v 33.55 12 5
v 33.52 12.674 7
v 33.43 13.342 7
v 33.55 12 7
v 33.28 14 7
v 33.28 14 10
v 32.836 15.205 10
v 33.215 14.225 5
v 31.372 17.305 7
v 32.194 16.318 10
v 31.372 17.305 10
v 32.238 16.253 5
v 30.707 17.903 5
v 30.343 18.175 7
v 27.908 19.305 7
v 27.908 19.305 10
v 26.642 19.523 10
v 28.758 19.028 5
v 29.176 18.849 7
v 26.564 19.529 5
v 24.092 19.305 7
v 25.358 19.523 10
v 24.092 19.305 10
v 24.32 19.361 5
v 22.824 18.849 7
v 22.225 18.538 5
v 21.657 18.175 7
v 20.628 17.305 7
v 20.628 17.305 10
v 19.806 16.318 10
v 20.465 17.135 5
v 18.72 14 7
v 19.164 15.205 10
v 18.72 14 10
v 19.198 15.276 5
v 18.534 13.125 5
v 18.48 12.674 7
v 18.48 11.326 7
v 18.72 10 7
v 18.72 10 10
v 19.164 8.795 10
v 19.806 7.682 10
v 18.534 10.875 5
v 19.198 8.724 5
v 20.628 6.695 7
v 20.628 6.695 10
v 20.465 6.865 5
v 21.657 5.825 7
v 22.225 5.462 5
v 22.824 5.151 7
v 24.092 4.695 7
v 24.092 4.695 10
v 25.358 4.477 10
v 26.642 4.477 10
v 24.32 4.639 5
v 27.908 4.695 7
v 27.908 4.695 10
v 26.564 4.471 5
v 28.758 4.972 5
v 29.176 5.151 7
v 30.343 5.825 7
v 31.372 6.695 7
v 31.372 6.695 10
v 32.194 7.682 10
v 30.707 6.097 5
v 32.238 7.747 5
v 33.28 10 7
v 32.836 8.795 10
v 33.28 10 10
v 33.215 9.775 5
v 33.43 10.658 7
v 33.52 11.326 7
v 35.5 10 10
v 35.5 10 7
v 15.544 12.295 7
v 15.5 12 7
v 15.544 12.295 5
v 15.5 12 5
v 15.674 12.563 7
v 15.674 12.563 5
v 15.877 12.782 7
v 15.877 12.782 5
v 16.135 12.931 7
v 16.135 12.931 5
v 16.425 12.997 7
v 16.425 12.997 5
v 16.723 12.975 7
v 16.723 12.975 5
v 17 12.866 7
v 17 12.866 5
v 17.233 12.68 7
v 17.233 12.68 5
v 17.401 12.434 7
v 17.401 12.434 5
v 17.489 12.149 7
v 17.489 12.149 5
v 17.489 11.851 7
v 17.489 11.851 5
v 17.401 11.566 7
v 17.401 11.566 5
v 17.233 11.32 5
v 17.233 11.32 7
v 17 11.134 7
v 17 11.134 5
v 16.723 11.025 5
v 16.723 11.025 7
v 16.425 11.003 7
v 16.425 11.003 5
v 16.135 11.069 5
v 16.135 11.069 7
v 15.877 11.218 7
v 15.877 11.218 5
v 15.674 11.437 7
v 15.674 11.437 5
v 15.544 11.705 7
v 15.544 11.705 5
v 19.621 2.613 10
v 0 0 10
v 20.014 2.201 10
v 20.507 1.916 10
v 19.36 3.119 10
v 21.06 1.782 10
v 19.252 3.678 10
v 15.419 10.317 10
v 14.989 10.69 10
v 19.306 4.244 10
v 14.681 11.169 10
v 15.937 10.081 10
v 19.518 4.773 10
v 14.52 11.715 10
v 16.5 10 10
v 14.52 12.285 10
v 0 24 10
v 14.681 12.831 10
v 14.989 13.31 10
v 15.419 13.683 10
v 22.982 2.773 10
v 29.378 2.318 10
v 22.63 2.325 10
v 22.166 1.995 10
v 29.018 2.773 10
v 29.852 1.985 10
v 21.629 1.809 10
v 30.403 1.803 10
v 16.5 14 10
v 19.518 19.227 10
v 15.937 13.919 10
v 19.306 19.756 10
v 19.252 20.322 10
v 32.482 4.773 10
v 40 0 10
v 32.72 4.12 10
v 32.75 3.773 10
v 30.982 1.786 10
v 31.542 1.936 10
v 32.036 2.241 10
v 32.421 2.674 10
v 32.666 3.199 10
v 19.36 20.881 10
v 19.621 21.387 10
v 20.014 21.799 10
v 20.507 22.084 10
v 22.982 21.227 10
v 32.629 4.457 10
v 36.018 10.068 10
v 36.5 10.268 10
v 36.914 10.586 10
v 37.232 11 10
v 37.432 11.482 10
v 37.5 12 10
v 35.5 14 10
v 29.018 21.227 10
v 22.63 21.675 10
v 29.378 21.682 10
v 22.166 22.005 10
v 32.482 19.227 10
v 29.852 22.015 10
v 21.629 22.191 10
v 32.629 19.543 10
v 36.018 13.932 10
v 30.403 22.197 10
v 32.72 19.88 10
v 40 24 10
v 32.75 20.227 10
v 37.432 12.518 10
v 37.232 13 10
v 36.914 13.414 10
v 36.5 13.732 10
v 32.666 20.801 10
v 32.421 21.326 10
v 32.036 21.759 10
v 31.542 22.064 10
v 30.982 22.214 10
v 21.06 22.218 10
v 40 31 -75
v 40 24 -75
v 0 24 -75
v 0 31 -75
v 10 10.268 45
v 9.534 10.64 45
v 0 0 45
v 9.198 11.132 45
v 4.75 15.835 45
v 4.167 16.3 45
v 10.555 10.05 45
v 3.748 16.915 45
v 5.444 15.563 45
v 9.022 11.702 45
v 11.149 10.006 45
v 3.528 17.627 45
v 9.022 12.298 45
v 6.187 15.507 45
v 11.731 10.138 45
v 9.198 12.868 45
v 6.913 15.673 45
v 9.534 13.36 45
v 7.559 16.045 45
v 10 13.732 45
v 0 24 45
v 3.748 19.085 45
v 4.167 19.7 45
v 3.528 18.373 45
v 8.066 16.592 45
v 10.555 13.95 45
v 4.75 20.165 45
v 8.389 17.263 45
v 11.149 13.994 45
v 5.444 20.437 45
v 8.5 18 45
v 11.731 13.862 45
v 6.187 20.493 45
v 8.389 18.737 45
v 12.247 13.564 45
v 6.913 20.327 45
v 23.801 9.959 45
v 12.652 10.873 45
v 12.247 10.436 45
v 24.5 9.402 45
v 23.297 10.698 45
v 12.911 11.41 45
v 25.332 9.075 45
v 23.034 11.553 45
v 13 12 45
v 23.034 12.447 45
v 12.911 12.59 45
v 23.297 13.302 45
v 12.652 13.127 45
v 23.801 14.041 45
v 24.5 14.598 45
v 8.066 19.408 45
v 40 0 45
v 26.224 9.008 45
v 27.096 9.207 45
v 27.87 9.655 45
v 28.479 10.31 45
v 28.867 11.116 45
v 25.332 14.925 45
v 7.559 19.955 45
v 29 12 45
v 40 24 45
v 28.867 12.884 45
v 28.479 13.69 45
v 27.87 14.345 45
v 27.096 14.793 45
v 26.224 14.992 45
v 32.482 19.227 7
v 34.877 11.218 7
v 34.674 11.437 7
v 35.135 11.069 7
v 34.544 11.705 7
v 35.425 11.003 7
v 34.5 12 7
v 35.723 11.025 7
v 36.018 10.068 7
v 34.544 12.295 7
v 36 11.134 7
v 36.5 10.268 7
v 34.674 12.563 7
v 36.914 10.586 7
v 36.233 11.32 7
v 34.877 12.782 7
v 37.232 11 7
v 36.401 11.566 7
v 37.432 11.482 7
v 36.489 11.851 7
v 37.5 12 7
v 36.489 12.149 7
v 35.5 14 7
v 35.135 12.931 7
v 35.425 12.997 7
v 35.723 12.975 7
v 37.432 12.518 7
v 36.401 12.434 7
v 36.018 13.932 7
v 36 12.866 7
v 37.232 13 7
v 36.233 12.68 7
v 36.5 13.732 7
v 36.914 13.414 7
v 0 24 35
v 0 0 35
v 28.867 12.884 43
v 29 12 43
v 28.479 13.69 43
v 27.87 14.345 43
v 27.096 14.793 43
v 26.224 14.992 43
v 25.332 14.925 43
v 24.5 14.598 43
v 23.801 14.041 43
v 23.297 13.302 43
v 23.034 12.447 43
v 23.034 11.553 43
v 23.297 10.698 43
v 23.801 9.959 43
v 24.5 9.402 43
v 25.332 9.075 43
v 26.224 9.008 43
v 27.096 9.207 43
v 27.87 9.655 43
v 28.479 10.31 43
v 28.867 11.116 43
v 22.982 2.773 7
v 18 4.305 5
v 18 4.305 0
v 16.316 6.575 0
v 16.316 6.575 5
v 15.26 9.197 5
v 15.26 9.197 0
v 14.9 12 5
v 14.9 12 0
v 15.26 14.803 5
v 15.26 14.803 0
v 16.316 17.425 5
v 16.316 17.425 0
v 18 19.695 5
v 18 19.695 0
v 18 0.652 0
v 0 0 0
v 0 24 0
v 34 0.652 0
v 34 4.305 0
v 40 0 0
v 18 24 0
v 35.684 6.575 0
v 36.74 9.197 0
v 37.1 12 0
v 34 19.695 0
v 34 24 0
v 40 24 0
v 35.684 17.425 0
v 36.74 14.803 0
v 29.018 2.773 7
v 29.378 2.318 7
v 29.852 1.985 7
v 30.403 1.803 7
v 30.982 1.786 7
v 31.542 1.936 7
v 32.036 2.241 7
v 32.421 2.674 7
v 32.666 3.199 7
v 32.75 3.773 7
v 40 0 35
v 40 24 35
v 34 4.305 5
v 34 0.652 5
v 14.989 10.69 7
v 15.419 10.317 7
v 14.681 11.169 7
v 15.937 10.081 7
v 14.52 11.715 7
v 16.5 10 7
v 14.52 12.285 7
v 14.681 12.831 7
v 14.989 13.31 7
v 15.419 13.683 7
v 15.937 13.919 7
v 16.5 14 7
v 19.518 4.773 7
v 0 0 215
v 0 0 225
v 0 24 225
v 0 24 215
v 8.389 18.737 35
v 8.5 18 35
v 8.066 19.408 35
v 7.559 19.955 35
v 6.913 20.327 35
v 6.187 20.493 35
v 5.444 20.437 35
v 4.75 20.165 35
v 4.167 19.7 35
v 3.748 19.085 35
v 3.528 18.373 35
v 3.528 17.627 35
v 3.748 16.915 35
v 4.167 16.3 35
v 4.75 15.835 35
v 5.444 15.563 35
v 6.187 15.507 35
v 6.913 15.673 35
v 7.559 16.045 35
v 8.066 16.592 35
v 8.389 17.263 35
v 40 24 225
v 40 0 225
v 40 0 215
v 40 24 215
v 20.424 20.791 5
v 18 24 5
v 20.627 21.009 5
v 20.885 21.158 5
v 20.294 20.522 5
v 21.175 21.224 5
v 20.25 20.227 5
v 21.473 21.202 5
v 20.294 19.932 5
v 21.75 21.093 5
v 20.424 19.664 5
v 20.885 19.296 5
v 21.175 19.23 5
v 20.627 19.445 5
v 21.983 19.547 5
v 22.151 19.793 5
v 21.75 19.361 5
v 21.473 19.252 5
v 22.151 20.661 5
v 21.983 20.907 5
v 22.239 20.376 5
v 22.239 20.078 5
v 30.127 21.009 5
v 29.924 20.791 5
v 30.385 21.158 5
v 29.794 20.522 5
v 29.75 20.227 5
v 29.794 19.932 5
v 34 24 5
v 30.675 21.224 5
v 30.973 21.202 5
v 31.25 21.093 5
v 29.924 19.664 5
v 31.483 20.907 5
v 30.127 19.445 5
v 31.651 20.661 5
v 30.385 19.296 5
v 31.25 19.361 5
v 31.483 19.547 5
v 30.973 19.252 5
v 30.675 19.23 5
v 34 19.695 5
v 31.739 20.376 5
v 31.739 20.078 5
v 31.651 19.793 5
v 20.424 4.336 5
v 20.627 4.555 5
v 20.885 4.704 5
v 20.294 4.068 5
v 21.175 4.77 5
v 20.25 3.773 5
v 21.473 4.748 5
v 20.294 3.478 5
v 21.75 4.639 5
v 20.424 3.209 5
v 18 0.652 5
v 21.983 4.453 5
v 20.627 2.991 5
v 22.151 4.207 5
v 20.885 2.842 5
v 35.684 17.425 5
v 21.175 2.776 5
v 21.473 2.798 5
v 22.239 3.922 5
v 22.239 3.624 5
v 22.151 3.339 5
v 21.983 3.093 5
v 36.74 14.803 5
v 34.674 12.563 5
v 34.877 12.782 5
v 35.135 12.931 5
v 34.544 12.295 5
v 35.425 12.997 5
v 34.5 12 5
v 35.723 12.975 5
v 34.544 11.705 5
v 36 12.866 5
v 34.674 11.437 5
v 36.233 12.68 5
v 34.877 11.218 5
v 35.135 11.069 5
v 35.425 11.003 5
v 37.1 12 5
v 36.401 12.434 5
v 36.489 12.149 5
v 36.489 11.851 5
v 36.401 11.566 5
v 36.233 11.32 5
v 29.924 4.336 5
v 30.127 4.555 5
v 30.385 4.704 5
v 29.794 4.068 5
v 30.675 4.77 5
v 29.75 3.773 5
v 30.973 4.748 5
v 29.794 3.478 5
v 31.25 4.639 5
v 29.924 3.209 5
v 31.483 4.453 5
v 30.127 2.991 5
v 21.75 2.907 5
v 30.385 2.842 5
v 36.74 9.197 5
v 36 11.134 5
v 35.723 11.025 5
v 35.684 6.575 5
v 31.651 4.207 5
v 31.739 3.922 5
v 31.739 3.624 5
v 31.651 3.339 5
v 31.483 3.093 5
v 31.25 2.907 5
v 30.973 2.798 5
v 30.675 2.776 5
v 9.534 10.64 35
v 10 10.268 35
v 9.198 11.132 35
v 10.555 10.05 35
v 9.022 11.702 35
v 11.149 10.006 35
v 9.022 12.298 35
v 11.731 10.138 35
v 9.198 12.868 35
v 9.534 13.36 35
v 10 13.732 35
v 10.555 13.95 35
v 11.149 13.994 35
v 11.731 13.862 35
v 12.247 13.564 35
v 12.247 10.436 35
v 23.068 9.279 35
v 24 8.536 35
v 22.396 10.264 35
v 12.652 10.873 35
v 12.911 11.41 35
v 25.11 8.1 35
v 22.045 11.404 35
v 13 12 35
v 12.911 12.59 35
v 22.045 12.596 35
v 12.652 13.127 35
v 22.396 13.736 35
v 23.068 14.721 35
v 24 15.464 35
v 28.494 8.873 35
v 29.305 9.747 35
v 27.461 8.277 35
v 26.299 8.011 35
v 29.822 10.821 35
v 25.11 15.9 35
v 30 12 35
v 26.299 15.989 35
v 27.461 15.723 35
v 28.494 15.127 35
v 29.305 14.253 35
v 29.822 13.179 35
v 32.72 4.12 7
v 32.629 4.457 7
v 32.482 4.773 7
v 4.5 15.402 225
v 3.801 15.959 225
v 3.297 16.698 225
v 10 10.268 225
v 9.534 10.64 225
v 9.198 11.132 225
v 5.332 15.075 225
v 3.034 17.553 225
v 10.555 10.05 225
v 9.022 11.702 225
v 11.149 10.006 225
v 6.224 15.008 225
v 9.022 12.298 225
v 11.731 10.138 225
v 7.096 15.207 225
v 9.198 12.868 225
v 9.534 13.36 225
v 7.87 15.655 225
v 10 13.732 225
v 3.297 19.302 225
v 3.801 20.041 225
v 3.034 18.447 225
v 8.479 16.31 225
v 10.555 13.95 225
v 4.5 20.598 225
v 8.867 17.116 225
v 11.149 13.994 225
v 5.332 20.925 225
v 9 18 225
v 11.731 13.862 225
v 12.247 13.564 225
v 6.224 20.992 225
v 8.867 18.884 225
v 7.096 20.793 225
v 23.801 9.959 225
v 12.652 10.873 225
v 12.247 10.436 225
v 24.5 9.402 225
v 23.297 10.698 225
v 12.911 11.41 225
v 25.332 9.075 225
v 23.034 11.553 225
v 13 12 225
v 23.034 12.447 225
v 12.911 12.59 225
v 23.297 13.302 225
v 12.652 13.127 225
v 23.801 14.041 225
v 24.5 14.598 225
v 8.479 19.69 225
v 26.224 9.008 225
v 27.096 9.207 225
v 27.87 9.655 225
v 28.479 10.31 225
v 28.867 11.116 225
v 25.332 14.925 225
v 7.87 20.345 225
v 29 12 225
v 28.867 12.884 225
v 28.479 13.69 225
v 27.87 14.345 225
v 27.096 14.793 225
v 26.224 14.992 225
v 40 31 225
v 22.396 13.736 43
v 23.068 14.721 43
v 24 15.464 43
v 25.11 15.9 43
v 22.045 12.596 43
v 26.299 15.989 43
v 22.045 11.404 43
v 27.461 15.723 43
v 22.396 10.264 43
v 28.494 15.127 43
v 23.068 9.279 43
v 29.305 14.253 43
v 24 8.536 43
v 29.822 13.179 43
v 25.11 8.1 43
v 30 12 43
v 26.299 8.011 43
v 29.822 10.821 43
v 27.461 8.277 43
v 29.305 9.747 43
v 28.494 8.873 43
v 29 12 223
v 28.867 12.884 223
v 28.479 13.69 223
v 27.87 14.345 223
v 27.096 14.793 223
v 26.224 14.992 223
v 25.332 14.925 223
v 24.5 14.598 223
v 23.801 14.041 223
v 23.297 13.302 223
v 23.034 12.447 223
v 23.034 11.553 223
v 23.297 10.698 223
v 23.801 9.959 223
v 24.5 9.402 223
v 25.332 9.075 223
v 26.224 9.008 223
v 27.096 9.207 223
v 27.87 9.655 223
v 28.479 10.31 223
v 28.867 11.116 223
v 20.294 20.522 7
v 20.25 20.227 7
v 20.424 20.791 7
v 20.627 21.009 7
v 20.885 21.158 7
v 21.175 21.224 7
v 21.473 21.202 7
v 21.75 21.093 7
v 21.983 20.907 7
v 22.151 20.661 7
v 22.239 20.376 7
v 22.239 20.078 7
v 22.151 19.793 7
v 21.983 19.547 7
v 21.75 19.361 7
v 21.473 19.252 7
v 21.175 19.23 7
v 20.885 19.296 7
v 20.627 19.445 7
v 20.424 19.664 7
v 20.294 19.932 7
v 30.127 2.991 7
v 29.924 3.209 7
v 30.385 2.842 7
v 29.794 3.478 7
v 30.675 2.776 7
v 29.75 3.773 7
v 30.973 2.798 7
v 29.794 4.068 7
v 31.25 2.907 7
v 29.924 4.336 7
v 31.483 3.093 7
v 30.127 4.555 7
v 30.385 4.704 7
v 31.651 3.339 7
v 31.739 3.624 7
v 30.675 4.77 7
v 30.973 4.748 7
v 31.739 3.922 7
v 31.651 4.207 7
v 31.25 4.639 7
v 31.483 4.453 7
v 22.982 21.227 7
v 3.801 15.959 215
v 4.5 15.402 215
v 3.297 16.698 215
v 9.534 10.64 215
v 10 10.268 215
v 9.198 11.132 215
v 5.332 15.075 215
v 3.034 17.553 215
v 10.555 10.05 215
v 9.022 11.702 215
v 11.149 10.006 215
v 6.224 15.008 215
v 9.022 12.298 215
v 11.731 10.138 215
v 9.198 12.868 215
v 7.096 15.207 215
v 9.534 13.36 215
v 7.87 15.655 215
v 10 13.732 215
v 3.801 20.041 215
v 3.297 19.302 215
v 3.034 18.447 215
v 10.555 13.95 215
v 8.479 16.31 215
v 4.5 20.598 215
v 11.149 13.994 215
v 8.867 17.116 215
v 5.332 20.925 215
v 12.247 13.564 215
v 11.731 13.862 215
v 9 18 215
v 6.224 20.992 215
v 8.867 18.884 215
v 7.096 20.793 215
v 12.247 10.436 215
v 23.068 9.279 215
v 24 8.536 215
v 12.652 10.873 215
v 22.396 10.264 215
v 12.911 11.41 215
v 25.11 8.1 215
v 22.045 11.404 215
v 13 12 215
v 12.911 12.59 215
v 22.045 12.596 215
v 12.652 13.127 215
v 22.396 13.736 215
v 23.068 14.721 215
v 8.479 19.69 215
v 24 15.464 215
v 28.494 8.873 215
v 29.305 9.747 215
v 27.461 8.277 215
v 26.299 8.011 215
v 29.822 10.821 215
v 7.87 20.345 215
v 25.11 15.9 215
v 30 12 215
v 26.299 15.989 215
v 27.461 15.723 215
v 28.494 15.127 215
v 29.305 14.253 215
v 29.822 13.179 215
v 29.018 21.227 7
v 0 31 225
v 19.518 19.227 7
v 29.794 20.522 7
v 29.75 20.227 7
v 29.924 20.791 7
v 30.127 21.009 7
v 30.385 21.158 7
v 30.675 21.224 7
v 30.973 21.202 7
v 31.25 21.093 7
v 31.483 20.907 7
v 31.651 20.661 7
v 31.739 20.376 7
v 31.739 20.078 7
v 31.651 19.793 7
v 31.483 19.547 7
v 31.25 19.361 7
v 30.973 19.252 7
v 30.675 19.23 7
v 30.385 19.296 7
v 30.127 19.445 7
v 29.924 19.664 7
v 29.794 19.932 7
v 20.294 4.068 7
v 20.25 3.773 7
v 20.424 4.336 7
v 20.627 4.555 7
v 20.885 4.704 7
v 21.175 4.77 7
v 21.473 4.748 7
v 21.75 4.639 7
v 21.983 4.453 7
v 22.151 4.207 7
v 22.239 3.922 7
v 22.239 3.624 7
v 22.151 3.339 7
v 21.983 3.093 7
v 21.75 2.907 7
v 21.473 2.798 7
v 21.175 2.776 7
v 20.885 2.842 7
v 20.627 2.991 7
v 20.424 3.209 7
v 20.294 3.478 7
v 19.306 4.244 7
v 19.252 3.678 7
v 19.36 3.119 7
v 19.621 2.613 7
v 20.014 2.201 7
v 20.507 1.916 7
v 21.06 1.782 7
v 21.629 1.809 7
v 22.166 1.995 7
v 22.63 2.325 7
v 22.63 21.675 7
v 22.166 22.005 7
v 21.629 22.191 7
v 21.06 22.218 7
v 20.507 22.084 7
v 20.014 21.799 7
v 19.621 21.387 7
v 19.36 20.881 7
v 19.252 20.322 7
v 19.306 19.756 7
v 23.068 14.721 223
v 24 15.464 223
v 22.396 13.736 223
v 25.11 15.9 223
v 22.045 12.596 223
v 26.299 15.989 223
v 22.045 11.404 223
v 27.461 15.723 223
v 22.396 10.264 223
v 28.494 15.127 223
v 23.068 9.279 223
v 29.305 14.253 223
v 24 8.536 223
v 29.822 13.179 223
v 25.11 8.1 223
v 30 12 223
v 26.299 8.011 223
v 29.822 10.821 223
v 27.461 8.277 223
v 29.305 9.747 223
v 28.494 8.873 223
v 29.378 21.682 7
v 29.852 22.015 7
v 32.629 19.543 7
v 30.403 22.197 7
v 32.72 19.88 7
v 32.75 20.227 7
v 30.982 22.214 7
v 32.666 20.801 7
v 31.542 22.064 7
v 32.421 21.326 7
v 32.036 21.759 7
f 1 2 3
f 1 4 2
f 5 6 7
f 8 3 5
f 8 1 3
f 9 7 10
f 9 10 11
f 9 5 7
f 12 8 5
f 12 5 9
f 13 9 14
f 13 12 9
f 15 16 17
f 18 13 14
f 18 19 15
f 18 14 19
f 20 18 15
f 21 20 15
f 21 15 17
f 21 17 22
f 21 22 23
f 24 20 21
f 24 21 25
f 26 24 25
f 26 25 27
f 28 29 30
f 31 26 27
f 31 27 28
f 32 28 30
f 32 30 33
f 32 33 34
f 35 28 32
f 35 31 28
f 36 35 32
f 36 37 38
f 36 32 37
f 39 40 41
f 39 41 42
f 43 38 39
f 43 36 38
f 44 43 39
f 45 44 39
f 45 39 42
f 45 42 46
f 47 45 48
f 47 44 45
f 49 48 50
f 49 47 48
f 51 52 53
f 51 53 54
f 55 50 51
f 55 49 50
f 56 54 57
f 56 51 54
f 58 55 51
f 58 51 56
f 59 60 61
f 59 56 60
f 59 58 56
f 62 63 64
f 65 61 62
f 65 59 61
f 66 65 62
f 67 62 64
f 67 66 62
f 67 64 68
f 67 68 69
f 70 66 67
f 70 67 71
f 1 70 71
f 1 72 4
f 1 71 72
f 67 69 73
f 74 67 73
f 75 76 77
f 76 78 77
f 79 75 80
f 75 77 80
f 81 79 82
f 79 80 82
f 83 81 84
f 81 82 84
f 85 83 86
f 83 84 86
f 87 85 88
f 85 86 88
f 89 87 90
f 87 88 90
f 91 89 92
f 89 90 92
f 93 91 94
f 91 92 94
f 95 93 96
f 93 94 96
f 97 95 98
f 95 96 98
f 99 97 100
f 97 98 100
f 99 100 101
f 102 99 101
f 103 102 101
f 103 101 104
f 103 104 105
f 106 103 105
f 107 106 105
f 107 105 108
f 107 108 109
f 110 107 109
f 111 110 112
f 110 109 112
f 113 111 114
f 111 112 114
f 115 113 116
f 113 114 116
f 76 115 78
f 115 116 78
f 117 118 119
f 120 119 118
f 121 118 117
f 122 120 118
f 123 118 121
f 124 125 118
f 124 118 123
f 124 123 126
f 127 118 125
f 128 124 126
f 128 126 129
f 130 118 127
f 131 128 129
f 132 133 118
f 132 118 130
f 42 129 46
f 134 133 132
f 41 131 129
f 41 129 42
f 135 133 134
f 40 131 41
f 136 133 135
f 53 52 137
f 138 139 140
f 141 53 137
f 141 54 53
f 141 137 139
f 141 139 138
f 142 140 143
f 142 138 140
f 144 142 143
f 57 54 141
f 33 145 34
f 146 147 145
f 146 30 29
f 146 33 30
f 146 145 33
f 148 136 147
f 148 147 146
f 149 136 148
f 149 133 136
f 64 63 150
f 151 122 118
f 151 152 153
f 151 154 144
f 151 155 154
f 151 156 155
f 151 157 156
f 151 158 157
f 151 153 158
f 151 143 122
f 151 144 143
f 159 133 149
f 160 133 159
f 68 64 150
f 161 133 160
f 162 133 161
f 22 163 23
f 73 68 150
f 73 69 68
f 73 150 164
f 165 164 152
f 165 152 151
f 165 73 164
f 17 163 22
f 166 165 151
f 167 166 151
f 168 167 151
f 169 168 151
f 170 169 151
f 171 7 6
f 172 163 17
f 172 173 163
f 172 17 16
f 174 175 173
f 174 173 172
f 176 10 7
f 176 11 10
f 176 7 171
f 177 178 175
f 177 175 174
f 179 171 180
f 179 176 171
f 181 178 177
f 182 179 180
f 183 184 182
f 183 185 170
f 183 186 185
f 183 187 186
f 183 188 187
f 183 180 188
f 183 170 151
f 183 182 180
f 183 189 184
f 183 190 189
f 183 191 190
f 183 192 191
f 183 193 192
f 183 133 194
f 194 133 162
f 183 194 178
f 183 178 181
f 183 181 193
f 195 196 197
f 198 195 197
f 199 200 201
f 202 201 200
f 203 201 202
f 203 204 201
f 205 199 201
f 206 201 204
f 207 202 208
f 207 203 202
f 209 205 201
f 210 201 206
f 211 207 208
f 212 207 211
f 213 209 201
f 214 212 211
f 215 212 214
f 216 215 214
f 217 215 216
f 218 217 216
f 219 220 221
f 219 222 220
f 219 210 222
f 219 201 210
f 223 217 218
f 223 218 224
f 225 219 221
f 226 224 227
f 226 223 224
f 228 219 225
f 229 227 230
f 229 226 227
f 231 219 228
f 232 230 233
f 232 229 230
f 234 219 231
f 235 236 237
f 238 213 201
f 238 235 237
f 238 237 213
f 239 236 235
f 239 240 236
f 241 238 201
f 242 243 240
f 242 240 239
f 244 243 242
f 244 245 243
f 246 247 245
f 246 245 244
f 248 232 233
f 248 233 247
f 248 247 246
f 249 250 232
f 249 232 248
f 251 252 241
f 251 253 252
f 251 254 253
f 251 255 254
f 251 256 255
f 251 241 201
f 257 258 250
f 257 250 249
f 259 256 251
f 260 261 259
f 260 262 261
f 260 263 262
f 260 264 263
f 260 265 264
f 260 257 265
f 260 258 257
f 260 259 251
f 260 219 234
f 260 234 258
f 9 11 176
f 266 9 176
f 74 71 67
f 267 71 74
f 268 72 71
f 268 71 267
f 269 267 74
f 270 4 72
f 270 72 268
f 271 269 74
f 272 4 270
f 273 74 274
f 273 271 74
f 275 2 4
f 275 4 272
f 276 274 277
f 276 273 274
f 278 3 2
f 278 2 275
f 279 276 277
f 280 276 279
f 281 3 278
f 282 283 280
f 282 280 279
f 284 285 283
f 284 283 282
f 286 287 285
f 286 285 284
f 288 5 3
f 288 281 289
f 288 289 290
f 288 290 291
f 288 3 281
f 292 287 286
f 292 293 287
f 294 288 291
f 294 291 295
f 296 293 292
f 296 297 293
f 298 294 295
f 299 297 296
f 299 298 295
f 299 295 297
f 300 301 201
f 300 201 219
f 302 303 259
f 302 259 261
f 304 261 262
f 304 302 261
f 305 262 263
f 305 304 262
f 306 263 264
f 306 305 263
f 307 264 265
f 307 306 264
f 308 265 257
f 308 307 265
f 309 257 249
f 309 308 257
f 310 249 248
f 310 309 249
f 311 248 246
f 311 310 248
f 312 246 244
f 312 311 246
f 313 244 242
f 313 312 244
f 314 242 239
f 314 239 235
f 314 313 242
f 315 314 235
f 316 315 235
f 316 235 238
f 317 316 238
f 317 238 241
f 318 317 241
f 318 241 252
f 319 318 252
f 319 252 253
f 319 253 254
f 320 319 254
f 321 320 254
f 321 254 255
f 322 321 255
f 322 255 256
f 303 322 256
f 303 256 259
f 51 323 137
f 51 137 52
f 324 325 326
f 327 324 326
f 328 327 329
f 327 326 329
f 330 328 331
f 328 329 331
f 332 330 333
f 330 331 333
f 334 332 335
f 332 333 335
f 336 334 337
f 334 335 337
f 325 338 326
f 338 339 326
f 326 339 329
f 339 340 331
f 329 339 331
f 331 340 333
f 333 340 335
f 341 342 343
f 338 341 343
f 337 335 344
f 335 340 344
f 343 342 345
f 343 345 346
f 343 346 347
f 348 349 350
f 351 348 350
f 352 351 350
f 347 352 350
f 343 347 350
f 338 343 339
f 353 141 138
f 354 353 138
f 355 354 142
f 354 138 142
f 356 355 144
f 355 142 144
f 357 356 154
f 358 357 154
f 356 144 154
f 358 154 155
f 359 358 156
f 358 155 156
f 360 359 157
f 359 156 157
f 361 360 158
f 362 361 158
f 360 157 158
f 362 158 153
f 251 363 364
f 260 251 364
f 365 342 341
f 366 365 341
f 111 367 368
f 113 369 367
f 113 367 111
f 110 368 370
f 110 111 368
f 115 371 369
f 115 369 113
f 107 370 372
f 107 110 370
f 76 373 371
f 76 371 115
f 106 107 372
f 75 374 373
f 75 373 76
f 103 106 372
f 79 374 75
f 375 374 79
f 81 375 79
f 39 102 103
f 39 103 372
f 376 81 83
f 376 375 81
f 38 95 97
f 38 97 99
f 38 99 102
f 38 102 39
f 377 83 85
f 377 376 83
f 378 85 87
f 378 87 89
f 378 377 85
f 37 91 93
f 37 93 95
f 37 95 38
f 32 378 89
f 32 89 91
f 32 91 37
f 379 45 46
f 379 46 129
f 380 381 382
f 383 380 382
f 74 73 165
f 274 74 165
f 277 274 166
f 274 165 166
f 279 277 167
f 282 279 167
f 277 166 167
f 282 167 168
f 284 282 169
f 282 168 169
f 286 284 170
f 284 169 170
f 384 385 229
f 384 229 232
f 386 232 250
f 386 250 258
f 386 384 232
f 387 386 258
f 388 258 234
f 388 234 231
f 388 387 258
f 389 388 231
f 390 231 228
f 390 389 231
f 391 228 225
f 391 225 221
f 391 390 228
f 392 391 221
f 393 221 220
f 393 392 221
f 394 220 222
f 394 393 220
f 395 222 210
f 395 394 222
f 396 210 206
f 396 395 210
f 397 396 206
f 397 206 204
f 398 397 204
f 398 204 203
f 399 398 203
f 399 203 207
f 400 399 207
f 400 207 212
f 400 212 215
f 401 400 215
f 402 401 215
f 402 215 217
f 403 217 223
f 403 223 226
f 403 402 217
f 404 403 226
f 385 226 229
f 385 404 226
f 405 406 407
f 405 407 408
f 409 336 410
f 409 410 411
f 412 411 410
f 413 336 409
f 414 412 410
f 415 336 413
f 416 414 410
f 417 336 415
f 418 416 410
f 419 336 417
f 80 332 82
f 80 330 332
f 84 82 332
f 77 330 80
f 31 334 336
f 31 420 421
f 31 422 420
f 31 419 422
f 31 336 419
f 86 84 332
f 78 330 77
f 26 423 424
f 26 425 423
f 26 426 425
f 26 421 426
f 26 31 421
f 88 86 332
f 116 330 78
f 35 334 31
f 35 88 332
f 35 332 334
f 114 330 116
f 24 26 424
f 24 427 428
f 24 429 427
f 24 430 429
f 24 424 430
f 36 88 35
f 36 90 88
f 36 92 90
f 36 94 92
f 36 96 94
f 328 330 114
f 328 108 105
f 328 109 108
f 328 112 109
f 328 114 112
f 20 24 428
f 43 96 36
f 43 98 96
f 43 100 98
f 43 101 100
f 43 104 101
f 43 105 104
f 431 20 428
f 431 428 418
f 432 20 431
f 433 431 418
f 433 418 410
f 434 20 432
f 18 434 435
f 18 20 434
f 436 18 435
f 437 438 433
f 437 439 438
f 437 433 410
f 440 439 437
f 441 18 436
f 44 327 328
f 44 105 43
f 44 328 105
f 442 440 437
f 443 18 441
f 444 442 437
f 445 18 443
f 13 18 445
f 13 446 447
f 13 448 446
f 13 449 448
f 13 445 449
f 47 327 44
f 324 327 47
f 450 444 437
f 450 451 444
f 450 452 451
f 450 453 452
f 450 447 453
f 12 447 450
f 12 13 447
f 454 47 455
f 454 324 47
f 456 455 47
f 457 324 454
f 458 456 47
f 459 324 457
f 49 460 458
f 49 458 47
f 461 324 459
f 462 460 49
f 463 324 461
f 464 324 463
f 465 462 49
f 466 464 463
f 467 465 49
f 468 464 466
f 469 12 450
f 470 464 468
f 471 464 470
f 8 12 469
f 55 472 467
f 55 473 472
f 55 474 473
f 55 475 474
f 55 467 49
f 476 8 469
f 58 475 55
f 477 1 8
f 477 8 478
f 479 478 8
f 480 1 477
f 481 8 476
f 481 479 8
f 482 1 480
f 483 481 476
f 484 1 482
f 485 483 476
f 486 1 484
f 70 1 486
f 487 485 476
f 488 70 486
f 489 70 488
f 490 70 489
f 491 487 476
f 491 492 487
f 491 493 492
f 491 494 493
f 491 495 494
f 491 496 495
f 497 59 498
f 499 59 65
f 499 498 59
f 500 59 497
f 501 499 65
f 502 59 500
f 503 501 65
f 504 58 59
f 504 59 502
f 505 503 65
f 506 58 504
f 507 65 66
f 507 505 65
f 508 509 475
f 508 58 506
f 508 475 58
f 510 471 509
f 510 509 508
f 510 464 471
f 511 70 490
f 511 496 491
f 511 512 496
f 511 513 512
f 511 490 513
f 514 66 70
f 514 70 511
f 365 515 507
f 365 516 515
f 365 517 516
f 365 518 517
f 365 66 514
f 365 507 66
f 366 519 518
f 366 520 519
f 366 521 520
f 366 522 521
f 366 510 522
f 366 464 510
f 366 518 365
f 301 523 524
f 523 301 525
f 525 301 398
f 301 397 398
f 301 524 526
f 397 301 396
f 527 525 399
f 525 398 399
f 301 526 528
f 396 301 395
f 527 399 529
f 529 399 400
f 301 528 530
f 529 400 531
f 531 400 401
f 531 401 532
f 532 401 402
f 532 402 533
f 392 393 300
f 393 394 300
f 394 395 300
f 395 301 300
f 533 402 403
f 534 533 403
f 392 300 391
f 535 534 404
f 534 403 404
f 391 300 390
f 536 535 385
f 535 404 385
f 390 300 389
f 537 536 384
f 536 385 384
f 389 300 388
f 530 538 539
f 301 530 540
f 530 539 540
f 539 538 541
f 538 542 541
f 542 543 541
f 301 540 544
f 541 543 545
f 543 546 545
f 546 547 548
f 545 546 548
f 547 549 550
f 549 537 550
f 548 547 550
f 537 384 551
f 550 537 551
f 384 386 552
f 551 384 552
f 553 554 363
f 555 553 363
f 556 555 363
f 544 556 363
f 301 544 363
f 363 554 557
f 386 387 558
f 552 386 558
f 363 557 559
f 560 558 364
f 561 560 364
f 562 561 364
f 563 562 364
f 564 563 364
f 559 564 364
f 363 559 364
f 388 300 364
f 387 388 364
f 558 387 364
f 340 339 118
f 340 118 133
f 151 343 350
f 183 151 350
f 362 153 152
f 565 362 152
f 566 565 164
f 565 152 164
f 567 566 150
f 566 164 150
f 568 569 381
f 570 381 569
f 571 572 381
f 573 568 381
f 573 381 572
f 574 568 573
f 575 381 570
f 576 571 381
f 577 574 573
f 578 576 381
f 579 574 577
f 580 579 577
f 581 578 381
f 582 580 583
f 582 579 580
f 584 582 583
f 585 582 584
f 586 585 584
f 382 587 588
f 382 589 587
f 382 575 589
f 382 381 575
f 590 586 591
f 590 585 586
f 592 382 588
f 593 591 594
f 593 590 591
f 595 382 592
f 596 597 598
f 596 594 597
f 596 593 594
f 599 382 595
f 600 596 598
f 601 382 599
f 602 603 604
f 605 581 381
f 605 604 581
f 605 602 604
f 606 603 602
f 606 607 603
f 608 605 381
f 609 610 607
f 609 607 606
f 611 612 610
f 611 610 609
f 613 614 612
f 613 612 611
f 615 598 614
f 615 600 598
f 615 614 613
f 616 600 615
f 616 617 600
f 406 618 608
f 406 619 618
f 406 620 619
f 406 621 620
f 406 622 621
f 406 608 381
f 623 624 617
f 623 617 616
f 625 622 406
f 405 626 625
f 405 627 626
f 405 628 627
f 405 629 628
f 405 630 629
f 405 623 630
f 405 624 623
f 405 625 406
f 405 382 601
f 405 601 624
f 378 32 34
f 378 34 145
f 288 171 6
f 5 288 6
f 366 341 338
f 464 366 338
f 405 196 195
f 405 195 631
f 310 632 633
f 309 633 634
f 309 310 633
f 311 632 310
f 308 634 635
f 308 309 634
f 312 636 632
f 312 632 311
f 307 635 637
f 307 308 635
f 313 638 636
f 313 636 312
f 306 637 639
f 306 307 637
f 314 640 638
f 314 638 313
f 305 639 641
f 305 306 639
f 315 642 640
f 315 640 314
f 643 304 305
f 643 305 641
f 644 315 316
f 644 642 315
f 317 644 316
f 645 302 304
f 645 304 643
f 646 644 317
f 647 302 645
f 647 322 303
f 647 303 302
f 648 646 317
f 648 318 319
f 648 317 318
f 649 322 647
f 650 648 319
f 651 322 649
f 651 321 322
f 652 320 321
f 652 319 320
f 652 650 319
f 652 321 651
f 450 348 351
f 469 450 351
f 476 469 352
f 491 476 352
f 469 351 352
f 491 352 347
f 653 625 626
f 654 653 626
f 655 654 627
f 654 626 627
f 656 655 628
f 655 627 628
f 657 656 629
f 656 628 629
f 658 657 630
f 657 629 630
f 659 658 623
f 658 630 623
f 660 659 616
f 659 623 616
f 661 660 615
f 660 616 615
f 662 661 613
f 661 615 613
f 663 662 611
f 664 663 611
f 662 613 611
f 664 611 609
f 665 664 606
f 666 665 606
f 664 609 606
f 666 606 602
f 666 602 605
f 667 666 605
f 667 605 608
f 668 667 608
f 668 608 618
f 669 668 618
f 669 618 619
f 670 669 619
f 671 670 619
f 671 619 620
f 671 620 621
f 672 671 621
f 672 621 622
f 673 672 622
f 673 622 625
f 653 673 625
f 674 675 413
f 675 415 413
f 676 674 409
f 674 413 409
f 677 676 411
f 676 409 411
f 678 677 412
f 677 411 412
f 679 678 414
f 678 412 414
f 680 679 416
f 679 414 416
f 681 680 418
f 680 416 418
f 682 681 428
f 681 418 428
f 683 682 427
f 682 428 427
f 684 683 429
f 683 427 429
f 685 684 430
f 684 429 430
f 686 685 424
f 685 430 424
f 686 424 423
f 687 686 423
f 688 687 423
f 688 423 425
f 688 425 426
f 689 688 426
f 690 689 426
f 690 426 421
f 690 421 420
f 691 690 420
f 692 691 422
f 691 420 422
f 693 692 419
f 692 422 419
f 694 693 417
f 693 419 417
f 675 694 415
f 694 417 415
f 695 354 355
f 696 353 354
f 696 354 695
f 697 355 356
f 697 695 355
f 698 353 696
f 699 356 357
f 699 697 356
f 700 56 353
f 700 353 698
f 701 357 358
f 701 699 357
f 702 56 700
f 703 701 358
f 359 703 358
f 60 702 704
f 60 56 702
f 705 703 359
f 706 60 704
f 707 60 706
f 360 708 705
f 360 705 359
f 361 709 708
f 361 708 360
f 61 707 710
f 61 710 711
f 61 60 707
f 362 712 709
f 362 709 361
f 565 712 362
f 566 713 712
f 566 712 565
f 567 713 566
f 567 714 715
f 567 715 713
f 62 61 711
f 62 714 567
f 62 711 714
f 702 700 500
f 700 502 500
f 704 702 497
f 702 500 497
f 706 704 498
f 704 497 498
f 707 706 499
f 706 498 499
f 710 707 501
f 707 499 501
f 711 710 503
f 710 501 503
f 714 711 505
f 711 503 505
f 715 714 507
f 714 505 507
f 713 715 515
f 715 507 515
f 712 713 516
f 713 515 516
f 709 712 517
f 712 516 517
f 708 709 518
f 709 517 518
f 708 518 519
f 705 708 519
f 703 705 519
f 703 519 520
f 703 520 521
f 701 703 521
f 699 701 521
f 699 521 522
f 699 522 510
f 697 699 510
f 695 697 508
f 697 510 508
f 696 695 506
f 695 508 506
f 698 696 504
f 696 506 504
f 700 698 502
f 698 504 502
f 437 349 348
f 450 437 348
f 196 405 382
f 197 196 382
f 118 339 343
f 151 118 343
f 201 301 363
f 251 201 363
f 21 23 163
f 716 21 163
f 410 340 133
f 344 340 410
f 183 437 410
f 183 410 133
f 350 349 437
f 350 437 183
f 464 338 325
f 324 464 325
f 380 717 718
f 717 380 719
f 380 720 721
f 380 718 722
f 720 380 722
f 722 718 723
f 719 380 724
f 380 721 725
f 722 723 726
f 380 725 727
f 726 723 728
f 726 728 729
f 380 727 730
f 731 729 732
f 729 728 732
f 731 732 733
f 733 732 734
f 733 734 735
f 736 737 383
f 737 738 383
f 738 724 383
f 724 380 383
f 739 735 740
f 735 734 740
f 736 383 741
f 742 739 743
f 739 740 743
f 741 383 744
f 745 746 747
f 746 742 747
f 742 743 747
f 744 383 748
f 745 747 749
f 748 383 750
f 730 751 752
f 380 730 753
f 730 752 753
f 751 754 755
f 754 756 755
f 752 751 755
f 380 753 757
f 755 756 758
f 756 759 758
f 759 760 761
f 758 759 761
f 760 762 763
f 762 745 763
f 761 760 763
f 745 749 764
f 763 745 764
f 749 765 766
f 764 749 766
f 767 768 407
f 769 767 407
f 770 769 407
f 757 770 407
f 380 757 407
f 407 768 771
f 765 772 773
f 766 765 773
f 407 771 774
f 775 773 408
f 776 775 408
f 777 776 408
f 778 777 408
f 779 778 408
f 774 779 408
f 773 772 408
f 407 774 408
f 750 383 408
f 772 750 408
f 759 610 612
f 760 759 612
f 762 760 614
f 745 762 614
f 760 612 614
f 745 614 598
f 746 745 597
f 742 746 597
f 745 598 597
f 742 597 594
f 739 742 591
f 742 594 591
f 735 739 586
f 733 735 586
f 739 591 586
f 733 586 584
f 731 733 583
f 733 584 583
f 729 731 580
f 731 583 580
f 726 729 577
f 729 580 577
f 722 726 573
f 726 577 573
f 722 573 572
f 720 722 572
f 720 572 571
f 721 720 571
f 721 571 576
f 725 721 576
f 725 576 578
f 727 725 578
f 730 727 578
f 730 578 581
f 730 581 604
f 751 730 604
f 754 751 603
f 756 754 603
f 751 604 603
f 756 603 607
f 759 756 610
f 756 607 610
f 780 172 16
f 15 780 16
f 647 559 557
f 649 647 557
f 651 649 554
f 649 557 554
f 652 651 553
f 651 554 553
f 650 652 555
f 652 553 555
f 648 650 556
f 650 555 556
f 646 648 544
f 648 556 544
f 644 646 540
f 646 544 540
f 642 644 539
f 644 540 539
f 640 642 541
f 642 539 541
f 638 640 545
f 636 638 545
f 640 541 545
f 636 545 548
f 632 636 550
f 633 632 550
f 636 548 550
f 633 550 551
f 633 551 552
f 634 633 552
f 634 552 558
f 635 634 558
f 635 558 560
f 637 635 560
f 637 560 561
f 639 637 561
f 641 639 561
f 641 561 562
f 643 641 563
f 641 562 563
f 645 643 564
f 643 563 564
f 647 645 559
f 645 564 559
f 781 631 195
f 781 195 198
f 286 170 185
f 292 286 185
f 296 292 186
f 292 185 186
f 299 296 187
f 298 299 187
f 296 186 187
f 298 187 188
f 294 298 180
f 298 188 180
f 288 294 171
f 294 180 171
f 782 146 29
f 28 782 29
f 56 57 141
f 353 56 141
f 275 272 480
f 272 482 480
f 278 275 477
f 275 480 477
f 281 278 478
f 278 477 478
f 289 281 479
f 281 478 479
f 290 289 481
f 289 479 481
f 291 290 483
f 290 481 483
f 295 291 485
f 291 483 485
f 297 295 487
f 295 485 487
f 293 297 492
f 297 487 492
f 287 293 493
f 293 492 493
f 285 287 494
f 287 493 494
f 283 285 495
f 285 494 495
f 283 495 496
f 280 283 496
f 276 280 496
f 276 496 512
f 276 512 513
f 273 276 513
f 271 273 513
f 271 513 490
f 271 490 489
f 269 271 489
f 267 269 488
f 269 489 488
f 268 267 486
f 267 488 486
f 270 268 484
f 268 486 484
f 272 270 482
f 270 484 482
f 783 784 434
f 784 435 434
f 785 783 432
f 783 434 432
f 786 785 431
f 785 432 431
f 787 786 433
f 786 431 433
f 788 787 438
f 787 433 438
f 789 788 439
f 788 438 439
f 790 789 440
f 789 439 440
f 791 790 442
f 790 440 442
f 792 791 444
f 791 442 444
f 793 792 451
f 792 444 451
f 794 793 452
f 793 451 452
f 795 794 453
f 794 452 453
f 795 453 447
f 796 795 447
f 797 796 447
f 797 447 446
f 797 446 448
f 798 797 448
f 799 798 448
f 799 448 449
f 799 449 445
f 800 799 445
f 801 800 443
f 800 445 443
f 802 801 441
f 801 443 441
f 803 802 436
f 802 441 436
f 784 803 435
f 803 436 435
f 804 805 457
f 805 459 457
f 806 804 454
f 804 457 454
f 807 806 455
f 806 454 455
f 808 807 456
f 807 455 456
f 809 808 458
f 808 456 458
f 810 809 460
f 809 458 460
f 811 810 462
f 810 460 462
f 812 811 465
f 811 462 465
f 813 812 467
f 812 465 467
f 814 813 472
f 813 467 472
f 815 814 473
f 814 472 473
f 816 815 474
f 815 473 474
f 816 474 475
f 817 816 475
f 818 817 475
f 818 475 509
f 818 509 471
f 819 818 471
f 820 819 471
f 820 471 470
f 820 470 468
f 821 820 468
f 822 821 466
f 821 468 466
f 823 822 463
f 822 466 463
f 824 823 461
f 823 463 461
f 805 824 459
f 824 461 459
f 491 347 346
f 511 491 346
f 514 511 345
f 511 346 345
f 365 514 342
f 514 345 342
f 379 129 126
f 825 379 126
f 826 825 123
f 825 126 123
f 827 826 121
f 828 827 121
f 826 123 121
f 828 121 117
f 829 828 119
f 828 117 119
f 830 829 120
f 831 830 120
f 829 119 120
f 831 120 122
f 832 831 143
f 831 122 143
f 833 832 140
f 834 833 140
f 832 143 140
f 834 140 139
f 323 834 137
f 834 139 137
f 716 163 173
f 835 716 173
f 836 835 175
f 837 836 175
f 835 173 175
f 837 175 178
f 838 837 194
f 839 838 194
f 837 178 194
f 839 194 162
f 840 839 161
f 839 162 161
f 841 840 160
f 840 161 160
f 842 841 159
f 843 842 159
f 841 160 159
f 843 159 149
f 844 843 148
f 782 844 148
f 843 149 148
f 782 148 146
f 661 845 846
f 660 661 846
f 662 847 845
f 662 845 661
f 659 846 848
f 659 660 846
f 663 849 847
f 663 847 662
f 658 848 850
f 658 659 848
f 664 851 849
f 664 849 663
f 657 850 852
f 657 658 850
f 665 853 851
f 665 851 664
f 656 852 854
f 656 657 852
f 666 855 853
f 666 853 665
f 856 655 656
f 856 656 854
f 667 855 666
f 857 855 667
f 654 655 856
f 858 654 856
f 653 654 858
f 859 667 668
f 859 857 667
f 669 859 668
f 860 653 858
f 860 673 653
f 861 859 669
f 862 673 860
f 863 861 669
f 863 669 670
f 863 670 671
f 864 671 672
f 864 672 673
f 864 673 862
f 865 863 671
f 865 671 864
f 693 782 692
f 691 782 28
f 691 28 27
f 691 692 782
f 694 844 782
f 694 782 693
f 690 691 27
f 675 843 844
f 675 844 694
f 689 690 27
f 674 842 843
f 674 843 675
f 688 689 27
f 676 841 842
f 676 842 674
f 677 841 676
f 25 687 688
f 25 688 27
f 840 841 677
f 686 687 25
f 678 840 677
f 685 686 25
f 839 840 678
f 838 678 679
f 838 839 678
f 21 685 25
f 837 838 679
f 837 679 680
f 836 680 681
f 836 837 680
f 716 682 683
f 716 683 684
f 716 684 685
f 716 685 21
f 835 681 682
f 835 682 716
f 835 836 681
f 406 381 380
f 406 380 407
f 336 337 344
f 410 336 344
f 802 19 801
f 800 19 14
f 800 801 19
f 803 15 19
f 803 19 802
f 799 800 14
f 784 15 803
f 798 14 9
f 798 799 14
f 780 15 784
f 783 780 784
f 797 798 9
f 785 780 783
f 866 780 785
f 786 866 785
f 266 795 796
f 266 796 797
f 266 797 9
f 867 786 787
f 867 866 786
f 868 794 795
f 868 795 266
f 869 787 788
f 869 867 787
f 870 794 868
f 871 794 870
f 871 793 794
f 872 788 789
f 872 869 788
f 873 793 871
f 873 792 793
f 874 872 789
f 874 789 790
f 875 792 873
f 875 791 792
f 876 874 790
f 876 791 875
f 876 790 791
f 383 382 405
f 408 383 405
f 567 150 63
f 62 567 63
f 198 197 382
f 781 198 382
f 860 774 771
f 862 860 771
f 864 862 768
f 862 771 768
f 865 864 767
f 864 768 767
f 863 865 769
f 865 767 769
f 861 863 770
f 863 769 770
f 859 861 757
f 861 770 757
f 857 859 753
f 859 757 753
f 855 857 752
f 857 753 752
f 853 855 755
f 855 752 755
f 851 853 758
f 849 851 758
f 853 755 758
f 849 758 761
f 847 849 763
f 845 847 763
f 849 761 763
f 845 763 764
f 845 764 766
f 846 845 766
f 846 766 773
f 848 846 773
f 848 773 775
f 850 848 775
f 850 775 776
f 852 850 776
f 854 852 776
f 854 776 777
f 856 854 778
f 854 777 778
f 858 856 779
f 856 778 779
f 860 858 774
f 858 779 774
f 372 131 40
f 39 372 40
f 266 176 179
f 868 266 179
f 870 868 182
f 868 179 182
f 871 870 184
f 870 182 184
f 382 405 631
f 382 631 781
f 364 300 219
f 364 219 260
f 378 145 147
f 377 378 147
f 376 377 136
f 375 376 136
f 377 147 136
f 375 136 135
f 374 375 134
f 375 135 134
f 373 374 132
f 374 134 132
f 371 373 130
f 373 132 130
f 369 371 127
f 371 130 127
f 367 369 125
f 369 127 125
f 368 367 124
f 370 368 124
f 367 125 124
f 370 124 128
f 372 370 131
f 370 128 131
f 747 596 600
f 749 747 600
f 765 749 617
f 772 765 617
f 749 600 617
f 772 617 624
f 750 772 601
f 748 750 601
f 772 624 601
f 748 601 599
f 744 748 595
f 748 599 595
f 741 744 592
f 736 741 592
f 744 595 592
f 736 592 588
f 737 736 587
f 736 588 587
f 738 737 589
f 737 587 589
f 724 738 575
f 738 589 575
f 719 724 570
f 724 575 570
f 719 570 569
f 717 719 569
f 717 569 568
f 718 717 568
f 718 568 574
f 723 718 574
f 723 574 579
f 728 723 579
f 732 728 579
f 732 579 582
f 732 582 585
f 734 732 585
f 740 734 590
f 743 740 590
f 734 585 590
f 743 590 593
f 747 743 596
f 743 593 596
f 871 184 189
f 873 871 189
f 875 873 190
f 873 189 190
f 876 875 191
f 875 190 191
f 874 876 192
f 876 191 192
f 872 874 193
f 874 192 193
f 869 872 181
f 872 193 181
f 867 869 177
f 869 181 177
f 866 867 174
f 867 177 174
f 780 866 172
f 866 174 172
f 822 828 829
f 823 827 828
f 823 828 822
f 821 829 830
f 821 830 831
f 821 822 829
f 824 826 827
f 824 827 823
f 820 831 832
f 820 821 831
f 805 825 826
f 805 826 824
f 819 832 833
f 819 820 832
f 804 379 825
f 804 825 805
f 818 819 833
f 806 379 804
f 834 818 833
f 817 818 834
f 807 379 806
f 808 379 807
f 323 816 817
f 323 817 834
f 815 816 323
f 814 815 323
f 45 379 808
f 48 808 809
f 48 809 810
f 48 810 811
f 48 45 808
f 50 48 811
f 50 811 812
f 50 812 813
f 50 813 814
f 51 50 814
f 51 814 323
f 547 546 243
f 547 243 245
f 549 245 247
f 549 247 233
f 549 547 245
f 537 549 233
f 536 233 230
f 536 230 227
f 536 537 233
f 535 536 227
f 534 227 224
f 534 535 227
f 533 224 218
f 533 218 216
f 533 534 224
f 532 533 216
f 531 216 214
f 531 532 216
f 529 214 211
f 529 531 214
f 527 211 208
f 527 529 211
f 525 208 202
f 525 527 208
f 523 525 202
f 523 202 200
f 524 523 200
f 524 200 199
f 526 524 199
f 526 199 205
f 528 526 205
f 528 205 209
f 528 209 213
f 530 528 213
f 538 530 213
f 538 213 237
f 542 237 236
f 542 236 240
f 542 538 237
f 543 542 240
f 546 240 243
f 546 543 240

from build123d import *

# Parameters (mm, degrees)
F0_W      = 40
F0_H      = 24
F0_R      = 7.55
F1_DEPTH  = 10
F3_D      = 2
F3_DEPTH  = 18
F3_TIP    = 0.600860619
F5_DEPTH  = 3
F7_DEPTH  = 5
F8_W      = 40
F8_H      = 300
F9_DEPTH  = 7
F10_W     = 40
F10_H     = 24
F10_R     = 2
F10_R_2   = 3
F11_DEPTH = 10
F12_R     = 4
F13_DEPTH = 8
F15_W     = 40
F15_H     = 24
F15_R     = 2
F15_R_2   = 2.5
F15_R_3   = 3
F16_DEPTH = 10
F17_R     = 4
F18_DEPTH = 8


with BuildPart() as f1:
    # F0 (on Top) → F1 (new body)
    with BuildSketch(Plane.XY):
        with Locations((20, 12)):
            Rectangle(F0_W, F0_H)
        with Locations((26, 12)):
            Circle(F0_R, mode=Mode.SUBTRACT)
    extrude(amount=F1_DEPTH)

    # F3
    with Locations(Plane.XY.offset(10)):
        with Locations((21.25, 20.227241336), (16.5, 12), (21.25, 3.772758664), (30.75, 3.772758664), (35.5, 12), (30.75, 20.227241336)):
            Hole(F3_D / 2, depth=F3_DEPTH)
            with Locations((0, 0, -(F3_DEPTH + F3_TIP / 2))):  # 118° drill point
                Cone(0, F3_D / 2, F3_TIP, mode=Mode.SUBTRACT)

    # F4 (on face) → F5 (cut)
    with BuildSketch(Plane.XY.offset(10)):
        with BuildLine():
            ThreePointArc((19.5179491924, 19.227241336), (21.7676380902, 18.2953896834), (23.25, 20.227241336))
            ThreePointArc((23.25, 20.227241336), (23.1818516526, 20.7448794262), (22.9820508076, 21.227241336))
            ThreePointArc((22.9820508076, 21.227241336), (20.25, 21.9592921435), (19.5179491924, 19.227241336))
        make_face()
        with BuildLine():
            ThreePointArc((22.9820508076, 21.227241336), (23.1818516526, 20.7448794262), (23.25, 20.227241336))
            ThreePointArc((23.25, 20.227241336), (21.7676380902, 18.2953896834), (19.5179491924, 19.227241336))
            Line((19.5179491924, 19.227241336), (22.5358983849, 14))
            Line((22.5358983849, 14), (24.8452994616, 14))
            Line((24.8452994616, 14), (26, 16))
            Line((26, 16), (22.9820508076, 21.227241336))
        make_face()
        with BuildLine():
            Line((29.0179491924, 21.227241336), (26, 16))
            Line((26, 16), (27.1547005384, 14))
            Line((27.1547005384, 14), (29.4641016151, 14))
            Line((29.4641016151, 14), (32.4820508076, 19.227241336))
            ThreePointArc((32.4820508076, 19.227241336), (29.75, 18.4951905284), (29.0179491924, 21.227241336))
        make_face()
        Polygon((27.1547005384, 14), (26, 16), (24.8452994616, 14), align=None)
        Polygon((24.8452994616, 14), (22.5358983849, 14), (23.6905989232, 12), align=None)
        with BuildLine():
            Line((23.6905989232, 12), (22.5358983849, 14))
            Line((22.5358983849, 14), (16.5, 14))
            ThreePointArc((16.5, 14), (17.9142135624, 13.4142135624), (18.5, 12))
            ThreePointArc((18.5, 12), (17.9142135624, 10.5857864376), (16.5, 10))
            Line((16.5, 10), (22.5358983849, 10))
            Line((22.5358983849, 10), (23.6905989232, 12))
        make_face()
        Polygon((29.4641016151, 14), (27.1547005384, 14), (28.3094010768, 12), align=None)
        with BuildLine():
            ThreePointArc((32.75, 20.227241336), (31.2676380902, 22.1590929885), (29.0179491924, 21.227241336))
            ThreePointArc((29.0179491924, 21.227241336), (29.75, 18.4951905284), (32.4820508076, 19.227241336))
            ThreePointArc((32.4820508076, 19.227241336), (32.6818516526, 19.7096032457), (32.75, 20.227241336))
        make_face()
        Polygon((24.8452994616, 10), (23.6905989232, 12), (22.5358983849, 10), align=None)
        with BuildLine():
            ThreePointArc((18.5, 12), (17.9142135624, 13.4142135624), (16.5, 14))
            ThreePointArc((16.5, 14), (14.5, 12), (16.5, 10))
            ThreePointArc((16.5, 10), (17.9142135624, 10.5857864376), (18.5, 12))
        make_face()
        with BuildLine():
            Line((29.4641016151, 14), (28.3094010768, 12))
            Line((28.3094010768, 12), (29.4641016151, 10))
            Line((29.4641016151, 10), (35.5, 10))
            ThreePointArc((35.5, 10), (33.5, 12), (35.5, 14))
            Line((35.5, 14), (29.4641016151, 14))
        make_face()
        Polygon((29.4641016151, 10), (28.3094010768, 12), (27.1547005384, 10), align=None)
        Polygon((27.1547005384, 10), (24.8452994616, 10), (26, 8), align=None)
        with BuildLine():
            Line((26, 8), (24.8452994616, 10))
            Line((24.8452994616, 10), (22.5358983849, 10))
            Line((22.5358983849, 10), (19.5179491924, 4.772758664))
            ThreePointArc((19.5179491924, 4.772758664), (21.7676380902, 5.7046103166), (23.25, 3.772758664))
            ThreePointArc((23.25, 3.772758664), (23.1818516526, 3.2551205738), (22.9820508076, 2.772758664))
            Line((22.9820508076, 2.772758664), (26, 8))
        make_face()
        with BuildLine():
            Line((32.4820508076, 4.772758664), (29.4641016151, 10))
            Line((29.4641016151, 10), (27.1547005384, 10))
            Line((27.1547005384, 10), (26, 8))
            Line((26, 8), (29.0179491924, 2.772758664))
            ThreePointArc((29.0179491924, 2.772758664), (29.75, 5.5048094716), (32.4820508076, 4.772758664))
        make_face()
        with BuildLine():
            ThreePointArc((37.5, 12), (36.9142135624, 13.4142135624), (35.5, 14))
            ThreePointArc((35.5, 14), (33.5, 12), (35.5, 10))
            ThreePointArc((35.5, 10), (36.9142135624, 10.5857864376), (37.5, 12))
        make_face()
        with BuildLine():
            ThreePointArc((23.25, 3.772758664), (21.7676380902, 5.7046103166), (19.5179491924, 4.772758664))
            ThreePointArc((19.5179491924, 4.772758664), (20.25, 2.0407078565), (22.9820508076, 2.772758664))
            ThreePointArc((22.9820508076, 2.772758664), (23.1818516526, 3.2551205738), (23.25, 3.772758664))
        make_face()
        with BuildLine():
            ThreePointArc((32.75, 3.772758664), (32.6818516526, 4.2903967543), (32.4820508076, 4.772758664))
            ThreePointArc((32.4820508076, 4.772758664), (29.75, 5.5048094716), (29.0179491924, 2.772758664))
            ThreePointArc((29.0179491924, 2.772758664), (31.2676380902, 1.8409070115), (32.75, 3.772758664))
        make_face()
    extrude(amount=-F5_DEPTH, mode=Mode.SUBTRACT)

    # F6 (on face) → F7 (cut)
    with BuildSketch(Plane(origin=(0, 0, 0), x_dir=(1, 0, 0), z_dir=(0, 0, -1))):
        with BuildLine():
            ThreePointArc((34, -19.6948034413), (36.2958729596, -16.1478910304), (37.1, -12))
            ThreePointArc((37.1, -12), (36.2958729596, -7.8521089696), (34, -4.3051965587))
            Line((34, -4.3051965587), (34, -19.6948034413))
        make_face()
        with BuildLine():
            Line((34, -19.6948034413), (34, -4.3051965587))
            ThreePointArc((34, -4.3051965587), (26, -0.9), (18, -4.3051965587))
            Line((18, -4.3051965587), (18, -19.6948034413))
            ThreePointArc((18, -19.6948034413), (26, -23.1), (34, -19.6948034413))
        make_face()
        with BuildLine():
            ThreePointArc((18, -4.3051965587), (26, -0.9), (34, -4.3051965587))
            Line((34, -4.3051965587), (34, -0.6517456127))
            Line((34, -0.6517456127), (18, -0.6517456127))
            Line((18, -0.6517456127), (18, -4.3051965587))
        make_face()
        with BuildLine():
            Line((34, -26.1574328393), (34, -19.6948034413))
            ThreePointArc((34, -19.6948034413), (26, -23.1), (18, -19.6948034413))
            Line((18, -19.6948034413), (18, -26.1574328393))
            Line((18, -26.1574328393), (34, -26.1574328393))
        make_face()
        with BuildLine():
            Line((18, -19.6948034413), (18, -4.3051965587))
            ThreePointArc((18, -4.3051965587), (14.9, -12), (18, -19.6948034413))
        make_face()
    extrude(amount=-F7_DEPTH, mode=Mode.SUBTRACT)


with BuildPart() as f9:
    # F8 (on face) → F9 (new body)
    with BuildSketch(Plane(origin=(0, 24, 0), x_dir=(-1, 0, 0), z_dir=(0, 1, 0))):
        with Locations((-20, 75)):
            Rectangle(F8_W, F8_H)
    extrude(amount=F9_DEPTH)


with BuildPart() as f11:
    # F10 (on face) → F11 (new body)
    with BuildSketch(Plane.XY.offset(225)):
        with Locations((20, 12)):
            Rectangle(F10_W, F10_H)
        with Locations((11, 12)):
            Circle(F10_R, mode=Mode.SUBTRACT)
        with Locations((6, 18)):
            Circle(F10_R_2, mode=Mode.SUBTRACT)
        with Locations((26, 12)):
            Circle(F10_R_2, mode=Mode.SUBTRACT)
    extrude(amount=-F11_DEPTH)

    # F12 (on face) → F13 (cut)
    with BuildSketch(Plane(origin=(0, 0, 215), x_dir=(1, 0, 0), z_dir=(0, 0, -1))):
        with Locations((26, -12)):
            Circle(F12_R)
    extrude(amount=-F13_DEPTH, mode=Mode.SUBTRACT)


with BuildPart() as f16:
    # F15 (on offset) → F16 (new body)
    with BuildSketch(Plane.XY.offset(35)):
        with Locations((20, 12)):
            Rectangle(F15_W, F15_H)
        with Locations((11, 12)):
            Circle(F15_R, mode=Mode.SUBTRACT)
        with Locations((6, 18)):
            Circle(F15_R_2, mode=Mode.SUBTRACT)
        with Locations((26, 12)):
            Circle(F15_R_3, mode=Mode.SUBTRACT)
    extrude(amount=F16_DEPTH)

    # F17 (on face) → F18 (cut)
    with BuildSketch(Plane(origin=(0, 0, 35), x_dir=(1, 0, 0), z_dir=(0, 0, -1))):
        with Locations((26, -12)):
            Circle(F17_R)
    extrude(amount=-F18_DEPTH, mode=Mode.SUBTRACT)


solid = Compound([f1.part, f9.part, f11.part, f16.part])
